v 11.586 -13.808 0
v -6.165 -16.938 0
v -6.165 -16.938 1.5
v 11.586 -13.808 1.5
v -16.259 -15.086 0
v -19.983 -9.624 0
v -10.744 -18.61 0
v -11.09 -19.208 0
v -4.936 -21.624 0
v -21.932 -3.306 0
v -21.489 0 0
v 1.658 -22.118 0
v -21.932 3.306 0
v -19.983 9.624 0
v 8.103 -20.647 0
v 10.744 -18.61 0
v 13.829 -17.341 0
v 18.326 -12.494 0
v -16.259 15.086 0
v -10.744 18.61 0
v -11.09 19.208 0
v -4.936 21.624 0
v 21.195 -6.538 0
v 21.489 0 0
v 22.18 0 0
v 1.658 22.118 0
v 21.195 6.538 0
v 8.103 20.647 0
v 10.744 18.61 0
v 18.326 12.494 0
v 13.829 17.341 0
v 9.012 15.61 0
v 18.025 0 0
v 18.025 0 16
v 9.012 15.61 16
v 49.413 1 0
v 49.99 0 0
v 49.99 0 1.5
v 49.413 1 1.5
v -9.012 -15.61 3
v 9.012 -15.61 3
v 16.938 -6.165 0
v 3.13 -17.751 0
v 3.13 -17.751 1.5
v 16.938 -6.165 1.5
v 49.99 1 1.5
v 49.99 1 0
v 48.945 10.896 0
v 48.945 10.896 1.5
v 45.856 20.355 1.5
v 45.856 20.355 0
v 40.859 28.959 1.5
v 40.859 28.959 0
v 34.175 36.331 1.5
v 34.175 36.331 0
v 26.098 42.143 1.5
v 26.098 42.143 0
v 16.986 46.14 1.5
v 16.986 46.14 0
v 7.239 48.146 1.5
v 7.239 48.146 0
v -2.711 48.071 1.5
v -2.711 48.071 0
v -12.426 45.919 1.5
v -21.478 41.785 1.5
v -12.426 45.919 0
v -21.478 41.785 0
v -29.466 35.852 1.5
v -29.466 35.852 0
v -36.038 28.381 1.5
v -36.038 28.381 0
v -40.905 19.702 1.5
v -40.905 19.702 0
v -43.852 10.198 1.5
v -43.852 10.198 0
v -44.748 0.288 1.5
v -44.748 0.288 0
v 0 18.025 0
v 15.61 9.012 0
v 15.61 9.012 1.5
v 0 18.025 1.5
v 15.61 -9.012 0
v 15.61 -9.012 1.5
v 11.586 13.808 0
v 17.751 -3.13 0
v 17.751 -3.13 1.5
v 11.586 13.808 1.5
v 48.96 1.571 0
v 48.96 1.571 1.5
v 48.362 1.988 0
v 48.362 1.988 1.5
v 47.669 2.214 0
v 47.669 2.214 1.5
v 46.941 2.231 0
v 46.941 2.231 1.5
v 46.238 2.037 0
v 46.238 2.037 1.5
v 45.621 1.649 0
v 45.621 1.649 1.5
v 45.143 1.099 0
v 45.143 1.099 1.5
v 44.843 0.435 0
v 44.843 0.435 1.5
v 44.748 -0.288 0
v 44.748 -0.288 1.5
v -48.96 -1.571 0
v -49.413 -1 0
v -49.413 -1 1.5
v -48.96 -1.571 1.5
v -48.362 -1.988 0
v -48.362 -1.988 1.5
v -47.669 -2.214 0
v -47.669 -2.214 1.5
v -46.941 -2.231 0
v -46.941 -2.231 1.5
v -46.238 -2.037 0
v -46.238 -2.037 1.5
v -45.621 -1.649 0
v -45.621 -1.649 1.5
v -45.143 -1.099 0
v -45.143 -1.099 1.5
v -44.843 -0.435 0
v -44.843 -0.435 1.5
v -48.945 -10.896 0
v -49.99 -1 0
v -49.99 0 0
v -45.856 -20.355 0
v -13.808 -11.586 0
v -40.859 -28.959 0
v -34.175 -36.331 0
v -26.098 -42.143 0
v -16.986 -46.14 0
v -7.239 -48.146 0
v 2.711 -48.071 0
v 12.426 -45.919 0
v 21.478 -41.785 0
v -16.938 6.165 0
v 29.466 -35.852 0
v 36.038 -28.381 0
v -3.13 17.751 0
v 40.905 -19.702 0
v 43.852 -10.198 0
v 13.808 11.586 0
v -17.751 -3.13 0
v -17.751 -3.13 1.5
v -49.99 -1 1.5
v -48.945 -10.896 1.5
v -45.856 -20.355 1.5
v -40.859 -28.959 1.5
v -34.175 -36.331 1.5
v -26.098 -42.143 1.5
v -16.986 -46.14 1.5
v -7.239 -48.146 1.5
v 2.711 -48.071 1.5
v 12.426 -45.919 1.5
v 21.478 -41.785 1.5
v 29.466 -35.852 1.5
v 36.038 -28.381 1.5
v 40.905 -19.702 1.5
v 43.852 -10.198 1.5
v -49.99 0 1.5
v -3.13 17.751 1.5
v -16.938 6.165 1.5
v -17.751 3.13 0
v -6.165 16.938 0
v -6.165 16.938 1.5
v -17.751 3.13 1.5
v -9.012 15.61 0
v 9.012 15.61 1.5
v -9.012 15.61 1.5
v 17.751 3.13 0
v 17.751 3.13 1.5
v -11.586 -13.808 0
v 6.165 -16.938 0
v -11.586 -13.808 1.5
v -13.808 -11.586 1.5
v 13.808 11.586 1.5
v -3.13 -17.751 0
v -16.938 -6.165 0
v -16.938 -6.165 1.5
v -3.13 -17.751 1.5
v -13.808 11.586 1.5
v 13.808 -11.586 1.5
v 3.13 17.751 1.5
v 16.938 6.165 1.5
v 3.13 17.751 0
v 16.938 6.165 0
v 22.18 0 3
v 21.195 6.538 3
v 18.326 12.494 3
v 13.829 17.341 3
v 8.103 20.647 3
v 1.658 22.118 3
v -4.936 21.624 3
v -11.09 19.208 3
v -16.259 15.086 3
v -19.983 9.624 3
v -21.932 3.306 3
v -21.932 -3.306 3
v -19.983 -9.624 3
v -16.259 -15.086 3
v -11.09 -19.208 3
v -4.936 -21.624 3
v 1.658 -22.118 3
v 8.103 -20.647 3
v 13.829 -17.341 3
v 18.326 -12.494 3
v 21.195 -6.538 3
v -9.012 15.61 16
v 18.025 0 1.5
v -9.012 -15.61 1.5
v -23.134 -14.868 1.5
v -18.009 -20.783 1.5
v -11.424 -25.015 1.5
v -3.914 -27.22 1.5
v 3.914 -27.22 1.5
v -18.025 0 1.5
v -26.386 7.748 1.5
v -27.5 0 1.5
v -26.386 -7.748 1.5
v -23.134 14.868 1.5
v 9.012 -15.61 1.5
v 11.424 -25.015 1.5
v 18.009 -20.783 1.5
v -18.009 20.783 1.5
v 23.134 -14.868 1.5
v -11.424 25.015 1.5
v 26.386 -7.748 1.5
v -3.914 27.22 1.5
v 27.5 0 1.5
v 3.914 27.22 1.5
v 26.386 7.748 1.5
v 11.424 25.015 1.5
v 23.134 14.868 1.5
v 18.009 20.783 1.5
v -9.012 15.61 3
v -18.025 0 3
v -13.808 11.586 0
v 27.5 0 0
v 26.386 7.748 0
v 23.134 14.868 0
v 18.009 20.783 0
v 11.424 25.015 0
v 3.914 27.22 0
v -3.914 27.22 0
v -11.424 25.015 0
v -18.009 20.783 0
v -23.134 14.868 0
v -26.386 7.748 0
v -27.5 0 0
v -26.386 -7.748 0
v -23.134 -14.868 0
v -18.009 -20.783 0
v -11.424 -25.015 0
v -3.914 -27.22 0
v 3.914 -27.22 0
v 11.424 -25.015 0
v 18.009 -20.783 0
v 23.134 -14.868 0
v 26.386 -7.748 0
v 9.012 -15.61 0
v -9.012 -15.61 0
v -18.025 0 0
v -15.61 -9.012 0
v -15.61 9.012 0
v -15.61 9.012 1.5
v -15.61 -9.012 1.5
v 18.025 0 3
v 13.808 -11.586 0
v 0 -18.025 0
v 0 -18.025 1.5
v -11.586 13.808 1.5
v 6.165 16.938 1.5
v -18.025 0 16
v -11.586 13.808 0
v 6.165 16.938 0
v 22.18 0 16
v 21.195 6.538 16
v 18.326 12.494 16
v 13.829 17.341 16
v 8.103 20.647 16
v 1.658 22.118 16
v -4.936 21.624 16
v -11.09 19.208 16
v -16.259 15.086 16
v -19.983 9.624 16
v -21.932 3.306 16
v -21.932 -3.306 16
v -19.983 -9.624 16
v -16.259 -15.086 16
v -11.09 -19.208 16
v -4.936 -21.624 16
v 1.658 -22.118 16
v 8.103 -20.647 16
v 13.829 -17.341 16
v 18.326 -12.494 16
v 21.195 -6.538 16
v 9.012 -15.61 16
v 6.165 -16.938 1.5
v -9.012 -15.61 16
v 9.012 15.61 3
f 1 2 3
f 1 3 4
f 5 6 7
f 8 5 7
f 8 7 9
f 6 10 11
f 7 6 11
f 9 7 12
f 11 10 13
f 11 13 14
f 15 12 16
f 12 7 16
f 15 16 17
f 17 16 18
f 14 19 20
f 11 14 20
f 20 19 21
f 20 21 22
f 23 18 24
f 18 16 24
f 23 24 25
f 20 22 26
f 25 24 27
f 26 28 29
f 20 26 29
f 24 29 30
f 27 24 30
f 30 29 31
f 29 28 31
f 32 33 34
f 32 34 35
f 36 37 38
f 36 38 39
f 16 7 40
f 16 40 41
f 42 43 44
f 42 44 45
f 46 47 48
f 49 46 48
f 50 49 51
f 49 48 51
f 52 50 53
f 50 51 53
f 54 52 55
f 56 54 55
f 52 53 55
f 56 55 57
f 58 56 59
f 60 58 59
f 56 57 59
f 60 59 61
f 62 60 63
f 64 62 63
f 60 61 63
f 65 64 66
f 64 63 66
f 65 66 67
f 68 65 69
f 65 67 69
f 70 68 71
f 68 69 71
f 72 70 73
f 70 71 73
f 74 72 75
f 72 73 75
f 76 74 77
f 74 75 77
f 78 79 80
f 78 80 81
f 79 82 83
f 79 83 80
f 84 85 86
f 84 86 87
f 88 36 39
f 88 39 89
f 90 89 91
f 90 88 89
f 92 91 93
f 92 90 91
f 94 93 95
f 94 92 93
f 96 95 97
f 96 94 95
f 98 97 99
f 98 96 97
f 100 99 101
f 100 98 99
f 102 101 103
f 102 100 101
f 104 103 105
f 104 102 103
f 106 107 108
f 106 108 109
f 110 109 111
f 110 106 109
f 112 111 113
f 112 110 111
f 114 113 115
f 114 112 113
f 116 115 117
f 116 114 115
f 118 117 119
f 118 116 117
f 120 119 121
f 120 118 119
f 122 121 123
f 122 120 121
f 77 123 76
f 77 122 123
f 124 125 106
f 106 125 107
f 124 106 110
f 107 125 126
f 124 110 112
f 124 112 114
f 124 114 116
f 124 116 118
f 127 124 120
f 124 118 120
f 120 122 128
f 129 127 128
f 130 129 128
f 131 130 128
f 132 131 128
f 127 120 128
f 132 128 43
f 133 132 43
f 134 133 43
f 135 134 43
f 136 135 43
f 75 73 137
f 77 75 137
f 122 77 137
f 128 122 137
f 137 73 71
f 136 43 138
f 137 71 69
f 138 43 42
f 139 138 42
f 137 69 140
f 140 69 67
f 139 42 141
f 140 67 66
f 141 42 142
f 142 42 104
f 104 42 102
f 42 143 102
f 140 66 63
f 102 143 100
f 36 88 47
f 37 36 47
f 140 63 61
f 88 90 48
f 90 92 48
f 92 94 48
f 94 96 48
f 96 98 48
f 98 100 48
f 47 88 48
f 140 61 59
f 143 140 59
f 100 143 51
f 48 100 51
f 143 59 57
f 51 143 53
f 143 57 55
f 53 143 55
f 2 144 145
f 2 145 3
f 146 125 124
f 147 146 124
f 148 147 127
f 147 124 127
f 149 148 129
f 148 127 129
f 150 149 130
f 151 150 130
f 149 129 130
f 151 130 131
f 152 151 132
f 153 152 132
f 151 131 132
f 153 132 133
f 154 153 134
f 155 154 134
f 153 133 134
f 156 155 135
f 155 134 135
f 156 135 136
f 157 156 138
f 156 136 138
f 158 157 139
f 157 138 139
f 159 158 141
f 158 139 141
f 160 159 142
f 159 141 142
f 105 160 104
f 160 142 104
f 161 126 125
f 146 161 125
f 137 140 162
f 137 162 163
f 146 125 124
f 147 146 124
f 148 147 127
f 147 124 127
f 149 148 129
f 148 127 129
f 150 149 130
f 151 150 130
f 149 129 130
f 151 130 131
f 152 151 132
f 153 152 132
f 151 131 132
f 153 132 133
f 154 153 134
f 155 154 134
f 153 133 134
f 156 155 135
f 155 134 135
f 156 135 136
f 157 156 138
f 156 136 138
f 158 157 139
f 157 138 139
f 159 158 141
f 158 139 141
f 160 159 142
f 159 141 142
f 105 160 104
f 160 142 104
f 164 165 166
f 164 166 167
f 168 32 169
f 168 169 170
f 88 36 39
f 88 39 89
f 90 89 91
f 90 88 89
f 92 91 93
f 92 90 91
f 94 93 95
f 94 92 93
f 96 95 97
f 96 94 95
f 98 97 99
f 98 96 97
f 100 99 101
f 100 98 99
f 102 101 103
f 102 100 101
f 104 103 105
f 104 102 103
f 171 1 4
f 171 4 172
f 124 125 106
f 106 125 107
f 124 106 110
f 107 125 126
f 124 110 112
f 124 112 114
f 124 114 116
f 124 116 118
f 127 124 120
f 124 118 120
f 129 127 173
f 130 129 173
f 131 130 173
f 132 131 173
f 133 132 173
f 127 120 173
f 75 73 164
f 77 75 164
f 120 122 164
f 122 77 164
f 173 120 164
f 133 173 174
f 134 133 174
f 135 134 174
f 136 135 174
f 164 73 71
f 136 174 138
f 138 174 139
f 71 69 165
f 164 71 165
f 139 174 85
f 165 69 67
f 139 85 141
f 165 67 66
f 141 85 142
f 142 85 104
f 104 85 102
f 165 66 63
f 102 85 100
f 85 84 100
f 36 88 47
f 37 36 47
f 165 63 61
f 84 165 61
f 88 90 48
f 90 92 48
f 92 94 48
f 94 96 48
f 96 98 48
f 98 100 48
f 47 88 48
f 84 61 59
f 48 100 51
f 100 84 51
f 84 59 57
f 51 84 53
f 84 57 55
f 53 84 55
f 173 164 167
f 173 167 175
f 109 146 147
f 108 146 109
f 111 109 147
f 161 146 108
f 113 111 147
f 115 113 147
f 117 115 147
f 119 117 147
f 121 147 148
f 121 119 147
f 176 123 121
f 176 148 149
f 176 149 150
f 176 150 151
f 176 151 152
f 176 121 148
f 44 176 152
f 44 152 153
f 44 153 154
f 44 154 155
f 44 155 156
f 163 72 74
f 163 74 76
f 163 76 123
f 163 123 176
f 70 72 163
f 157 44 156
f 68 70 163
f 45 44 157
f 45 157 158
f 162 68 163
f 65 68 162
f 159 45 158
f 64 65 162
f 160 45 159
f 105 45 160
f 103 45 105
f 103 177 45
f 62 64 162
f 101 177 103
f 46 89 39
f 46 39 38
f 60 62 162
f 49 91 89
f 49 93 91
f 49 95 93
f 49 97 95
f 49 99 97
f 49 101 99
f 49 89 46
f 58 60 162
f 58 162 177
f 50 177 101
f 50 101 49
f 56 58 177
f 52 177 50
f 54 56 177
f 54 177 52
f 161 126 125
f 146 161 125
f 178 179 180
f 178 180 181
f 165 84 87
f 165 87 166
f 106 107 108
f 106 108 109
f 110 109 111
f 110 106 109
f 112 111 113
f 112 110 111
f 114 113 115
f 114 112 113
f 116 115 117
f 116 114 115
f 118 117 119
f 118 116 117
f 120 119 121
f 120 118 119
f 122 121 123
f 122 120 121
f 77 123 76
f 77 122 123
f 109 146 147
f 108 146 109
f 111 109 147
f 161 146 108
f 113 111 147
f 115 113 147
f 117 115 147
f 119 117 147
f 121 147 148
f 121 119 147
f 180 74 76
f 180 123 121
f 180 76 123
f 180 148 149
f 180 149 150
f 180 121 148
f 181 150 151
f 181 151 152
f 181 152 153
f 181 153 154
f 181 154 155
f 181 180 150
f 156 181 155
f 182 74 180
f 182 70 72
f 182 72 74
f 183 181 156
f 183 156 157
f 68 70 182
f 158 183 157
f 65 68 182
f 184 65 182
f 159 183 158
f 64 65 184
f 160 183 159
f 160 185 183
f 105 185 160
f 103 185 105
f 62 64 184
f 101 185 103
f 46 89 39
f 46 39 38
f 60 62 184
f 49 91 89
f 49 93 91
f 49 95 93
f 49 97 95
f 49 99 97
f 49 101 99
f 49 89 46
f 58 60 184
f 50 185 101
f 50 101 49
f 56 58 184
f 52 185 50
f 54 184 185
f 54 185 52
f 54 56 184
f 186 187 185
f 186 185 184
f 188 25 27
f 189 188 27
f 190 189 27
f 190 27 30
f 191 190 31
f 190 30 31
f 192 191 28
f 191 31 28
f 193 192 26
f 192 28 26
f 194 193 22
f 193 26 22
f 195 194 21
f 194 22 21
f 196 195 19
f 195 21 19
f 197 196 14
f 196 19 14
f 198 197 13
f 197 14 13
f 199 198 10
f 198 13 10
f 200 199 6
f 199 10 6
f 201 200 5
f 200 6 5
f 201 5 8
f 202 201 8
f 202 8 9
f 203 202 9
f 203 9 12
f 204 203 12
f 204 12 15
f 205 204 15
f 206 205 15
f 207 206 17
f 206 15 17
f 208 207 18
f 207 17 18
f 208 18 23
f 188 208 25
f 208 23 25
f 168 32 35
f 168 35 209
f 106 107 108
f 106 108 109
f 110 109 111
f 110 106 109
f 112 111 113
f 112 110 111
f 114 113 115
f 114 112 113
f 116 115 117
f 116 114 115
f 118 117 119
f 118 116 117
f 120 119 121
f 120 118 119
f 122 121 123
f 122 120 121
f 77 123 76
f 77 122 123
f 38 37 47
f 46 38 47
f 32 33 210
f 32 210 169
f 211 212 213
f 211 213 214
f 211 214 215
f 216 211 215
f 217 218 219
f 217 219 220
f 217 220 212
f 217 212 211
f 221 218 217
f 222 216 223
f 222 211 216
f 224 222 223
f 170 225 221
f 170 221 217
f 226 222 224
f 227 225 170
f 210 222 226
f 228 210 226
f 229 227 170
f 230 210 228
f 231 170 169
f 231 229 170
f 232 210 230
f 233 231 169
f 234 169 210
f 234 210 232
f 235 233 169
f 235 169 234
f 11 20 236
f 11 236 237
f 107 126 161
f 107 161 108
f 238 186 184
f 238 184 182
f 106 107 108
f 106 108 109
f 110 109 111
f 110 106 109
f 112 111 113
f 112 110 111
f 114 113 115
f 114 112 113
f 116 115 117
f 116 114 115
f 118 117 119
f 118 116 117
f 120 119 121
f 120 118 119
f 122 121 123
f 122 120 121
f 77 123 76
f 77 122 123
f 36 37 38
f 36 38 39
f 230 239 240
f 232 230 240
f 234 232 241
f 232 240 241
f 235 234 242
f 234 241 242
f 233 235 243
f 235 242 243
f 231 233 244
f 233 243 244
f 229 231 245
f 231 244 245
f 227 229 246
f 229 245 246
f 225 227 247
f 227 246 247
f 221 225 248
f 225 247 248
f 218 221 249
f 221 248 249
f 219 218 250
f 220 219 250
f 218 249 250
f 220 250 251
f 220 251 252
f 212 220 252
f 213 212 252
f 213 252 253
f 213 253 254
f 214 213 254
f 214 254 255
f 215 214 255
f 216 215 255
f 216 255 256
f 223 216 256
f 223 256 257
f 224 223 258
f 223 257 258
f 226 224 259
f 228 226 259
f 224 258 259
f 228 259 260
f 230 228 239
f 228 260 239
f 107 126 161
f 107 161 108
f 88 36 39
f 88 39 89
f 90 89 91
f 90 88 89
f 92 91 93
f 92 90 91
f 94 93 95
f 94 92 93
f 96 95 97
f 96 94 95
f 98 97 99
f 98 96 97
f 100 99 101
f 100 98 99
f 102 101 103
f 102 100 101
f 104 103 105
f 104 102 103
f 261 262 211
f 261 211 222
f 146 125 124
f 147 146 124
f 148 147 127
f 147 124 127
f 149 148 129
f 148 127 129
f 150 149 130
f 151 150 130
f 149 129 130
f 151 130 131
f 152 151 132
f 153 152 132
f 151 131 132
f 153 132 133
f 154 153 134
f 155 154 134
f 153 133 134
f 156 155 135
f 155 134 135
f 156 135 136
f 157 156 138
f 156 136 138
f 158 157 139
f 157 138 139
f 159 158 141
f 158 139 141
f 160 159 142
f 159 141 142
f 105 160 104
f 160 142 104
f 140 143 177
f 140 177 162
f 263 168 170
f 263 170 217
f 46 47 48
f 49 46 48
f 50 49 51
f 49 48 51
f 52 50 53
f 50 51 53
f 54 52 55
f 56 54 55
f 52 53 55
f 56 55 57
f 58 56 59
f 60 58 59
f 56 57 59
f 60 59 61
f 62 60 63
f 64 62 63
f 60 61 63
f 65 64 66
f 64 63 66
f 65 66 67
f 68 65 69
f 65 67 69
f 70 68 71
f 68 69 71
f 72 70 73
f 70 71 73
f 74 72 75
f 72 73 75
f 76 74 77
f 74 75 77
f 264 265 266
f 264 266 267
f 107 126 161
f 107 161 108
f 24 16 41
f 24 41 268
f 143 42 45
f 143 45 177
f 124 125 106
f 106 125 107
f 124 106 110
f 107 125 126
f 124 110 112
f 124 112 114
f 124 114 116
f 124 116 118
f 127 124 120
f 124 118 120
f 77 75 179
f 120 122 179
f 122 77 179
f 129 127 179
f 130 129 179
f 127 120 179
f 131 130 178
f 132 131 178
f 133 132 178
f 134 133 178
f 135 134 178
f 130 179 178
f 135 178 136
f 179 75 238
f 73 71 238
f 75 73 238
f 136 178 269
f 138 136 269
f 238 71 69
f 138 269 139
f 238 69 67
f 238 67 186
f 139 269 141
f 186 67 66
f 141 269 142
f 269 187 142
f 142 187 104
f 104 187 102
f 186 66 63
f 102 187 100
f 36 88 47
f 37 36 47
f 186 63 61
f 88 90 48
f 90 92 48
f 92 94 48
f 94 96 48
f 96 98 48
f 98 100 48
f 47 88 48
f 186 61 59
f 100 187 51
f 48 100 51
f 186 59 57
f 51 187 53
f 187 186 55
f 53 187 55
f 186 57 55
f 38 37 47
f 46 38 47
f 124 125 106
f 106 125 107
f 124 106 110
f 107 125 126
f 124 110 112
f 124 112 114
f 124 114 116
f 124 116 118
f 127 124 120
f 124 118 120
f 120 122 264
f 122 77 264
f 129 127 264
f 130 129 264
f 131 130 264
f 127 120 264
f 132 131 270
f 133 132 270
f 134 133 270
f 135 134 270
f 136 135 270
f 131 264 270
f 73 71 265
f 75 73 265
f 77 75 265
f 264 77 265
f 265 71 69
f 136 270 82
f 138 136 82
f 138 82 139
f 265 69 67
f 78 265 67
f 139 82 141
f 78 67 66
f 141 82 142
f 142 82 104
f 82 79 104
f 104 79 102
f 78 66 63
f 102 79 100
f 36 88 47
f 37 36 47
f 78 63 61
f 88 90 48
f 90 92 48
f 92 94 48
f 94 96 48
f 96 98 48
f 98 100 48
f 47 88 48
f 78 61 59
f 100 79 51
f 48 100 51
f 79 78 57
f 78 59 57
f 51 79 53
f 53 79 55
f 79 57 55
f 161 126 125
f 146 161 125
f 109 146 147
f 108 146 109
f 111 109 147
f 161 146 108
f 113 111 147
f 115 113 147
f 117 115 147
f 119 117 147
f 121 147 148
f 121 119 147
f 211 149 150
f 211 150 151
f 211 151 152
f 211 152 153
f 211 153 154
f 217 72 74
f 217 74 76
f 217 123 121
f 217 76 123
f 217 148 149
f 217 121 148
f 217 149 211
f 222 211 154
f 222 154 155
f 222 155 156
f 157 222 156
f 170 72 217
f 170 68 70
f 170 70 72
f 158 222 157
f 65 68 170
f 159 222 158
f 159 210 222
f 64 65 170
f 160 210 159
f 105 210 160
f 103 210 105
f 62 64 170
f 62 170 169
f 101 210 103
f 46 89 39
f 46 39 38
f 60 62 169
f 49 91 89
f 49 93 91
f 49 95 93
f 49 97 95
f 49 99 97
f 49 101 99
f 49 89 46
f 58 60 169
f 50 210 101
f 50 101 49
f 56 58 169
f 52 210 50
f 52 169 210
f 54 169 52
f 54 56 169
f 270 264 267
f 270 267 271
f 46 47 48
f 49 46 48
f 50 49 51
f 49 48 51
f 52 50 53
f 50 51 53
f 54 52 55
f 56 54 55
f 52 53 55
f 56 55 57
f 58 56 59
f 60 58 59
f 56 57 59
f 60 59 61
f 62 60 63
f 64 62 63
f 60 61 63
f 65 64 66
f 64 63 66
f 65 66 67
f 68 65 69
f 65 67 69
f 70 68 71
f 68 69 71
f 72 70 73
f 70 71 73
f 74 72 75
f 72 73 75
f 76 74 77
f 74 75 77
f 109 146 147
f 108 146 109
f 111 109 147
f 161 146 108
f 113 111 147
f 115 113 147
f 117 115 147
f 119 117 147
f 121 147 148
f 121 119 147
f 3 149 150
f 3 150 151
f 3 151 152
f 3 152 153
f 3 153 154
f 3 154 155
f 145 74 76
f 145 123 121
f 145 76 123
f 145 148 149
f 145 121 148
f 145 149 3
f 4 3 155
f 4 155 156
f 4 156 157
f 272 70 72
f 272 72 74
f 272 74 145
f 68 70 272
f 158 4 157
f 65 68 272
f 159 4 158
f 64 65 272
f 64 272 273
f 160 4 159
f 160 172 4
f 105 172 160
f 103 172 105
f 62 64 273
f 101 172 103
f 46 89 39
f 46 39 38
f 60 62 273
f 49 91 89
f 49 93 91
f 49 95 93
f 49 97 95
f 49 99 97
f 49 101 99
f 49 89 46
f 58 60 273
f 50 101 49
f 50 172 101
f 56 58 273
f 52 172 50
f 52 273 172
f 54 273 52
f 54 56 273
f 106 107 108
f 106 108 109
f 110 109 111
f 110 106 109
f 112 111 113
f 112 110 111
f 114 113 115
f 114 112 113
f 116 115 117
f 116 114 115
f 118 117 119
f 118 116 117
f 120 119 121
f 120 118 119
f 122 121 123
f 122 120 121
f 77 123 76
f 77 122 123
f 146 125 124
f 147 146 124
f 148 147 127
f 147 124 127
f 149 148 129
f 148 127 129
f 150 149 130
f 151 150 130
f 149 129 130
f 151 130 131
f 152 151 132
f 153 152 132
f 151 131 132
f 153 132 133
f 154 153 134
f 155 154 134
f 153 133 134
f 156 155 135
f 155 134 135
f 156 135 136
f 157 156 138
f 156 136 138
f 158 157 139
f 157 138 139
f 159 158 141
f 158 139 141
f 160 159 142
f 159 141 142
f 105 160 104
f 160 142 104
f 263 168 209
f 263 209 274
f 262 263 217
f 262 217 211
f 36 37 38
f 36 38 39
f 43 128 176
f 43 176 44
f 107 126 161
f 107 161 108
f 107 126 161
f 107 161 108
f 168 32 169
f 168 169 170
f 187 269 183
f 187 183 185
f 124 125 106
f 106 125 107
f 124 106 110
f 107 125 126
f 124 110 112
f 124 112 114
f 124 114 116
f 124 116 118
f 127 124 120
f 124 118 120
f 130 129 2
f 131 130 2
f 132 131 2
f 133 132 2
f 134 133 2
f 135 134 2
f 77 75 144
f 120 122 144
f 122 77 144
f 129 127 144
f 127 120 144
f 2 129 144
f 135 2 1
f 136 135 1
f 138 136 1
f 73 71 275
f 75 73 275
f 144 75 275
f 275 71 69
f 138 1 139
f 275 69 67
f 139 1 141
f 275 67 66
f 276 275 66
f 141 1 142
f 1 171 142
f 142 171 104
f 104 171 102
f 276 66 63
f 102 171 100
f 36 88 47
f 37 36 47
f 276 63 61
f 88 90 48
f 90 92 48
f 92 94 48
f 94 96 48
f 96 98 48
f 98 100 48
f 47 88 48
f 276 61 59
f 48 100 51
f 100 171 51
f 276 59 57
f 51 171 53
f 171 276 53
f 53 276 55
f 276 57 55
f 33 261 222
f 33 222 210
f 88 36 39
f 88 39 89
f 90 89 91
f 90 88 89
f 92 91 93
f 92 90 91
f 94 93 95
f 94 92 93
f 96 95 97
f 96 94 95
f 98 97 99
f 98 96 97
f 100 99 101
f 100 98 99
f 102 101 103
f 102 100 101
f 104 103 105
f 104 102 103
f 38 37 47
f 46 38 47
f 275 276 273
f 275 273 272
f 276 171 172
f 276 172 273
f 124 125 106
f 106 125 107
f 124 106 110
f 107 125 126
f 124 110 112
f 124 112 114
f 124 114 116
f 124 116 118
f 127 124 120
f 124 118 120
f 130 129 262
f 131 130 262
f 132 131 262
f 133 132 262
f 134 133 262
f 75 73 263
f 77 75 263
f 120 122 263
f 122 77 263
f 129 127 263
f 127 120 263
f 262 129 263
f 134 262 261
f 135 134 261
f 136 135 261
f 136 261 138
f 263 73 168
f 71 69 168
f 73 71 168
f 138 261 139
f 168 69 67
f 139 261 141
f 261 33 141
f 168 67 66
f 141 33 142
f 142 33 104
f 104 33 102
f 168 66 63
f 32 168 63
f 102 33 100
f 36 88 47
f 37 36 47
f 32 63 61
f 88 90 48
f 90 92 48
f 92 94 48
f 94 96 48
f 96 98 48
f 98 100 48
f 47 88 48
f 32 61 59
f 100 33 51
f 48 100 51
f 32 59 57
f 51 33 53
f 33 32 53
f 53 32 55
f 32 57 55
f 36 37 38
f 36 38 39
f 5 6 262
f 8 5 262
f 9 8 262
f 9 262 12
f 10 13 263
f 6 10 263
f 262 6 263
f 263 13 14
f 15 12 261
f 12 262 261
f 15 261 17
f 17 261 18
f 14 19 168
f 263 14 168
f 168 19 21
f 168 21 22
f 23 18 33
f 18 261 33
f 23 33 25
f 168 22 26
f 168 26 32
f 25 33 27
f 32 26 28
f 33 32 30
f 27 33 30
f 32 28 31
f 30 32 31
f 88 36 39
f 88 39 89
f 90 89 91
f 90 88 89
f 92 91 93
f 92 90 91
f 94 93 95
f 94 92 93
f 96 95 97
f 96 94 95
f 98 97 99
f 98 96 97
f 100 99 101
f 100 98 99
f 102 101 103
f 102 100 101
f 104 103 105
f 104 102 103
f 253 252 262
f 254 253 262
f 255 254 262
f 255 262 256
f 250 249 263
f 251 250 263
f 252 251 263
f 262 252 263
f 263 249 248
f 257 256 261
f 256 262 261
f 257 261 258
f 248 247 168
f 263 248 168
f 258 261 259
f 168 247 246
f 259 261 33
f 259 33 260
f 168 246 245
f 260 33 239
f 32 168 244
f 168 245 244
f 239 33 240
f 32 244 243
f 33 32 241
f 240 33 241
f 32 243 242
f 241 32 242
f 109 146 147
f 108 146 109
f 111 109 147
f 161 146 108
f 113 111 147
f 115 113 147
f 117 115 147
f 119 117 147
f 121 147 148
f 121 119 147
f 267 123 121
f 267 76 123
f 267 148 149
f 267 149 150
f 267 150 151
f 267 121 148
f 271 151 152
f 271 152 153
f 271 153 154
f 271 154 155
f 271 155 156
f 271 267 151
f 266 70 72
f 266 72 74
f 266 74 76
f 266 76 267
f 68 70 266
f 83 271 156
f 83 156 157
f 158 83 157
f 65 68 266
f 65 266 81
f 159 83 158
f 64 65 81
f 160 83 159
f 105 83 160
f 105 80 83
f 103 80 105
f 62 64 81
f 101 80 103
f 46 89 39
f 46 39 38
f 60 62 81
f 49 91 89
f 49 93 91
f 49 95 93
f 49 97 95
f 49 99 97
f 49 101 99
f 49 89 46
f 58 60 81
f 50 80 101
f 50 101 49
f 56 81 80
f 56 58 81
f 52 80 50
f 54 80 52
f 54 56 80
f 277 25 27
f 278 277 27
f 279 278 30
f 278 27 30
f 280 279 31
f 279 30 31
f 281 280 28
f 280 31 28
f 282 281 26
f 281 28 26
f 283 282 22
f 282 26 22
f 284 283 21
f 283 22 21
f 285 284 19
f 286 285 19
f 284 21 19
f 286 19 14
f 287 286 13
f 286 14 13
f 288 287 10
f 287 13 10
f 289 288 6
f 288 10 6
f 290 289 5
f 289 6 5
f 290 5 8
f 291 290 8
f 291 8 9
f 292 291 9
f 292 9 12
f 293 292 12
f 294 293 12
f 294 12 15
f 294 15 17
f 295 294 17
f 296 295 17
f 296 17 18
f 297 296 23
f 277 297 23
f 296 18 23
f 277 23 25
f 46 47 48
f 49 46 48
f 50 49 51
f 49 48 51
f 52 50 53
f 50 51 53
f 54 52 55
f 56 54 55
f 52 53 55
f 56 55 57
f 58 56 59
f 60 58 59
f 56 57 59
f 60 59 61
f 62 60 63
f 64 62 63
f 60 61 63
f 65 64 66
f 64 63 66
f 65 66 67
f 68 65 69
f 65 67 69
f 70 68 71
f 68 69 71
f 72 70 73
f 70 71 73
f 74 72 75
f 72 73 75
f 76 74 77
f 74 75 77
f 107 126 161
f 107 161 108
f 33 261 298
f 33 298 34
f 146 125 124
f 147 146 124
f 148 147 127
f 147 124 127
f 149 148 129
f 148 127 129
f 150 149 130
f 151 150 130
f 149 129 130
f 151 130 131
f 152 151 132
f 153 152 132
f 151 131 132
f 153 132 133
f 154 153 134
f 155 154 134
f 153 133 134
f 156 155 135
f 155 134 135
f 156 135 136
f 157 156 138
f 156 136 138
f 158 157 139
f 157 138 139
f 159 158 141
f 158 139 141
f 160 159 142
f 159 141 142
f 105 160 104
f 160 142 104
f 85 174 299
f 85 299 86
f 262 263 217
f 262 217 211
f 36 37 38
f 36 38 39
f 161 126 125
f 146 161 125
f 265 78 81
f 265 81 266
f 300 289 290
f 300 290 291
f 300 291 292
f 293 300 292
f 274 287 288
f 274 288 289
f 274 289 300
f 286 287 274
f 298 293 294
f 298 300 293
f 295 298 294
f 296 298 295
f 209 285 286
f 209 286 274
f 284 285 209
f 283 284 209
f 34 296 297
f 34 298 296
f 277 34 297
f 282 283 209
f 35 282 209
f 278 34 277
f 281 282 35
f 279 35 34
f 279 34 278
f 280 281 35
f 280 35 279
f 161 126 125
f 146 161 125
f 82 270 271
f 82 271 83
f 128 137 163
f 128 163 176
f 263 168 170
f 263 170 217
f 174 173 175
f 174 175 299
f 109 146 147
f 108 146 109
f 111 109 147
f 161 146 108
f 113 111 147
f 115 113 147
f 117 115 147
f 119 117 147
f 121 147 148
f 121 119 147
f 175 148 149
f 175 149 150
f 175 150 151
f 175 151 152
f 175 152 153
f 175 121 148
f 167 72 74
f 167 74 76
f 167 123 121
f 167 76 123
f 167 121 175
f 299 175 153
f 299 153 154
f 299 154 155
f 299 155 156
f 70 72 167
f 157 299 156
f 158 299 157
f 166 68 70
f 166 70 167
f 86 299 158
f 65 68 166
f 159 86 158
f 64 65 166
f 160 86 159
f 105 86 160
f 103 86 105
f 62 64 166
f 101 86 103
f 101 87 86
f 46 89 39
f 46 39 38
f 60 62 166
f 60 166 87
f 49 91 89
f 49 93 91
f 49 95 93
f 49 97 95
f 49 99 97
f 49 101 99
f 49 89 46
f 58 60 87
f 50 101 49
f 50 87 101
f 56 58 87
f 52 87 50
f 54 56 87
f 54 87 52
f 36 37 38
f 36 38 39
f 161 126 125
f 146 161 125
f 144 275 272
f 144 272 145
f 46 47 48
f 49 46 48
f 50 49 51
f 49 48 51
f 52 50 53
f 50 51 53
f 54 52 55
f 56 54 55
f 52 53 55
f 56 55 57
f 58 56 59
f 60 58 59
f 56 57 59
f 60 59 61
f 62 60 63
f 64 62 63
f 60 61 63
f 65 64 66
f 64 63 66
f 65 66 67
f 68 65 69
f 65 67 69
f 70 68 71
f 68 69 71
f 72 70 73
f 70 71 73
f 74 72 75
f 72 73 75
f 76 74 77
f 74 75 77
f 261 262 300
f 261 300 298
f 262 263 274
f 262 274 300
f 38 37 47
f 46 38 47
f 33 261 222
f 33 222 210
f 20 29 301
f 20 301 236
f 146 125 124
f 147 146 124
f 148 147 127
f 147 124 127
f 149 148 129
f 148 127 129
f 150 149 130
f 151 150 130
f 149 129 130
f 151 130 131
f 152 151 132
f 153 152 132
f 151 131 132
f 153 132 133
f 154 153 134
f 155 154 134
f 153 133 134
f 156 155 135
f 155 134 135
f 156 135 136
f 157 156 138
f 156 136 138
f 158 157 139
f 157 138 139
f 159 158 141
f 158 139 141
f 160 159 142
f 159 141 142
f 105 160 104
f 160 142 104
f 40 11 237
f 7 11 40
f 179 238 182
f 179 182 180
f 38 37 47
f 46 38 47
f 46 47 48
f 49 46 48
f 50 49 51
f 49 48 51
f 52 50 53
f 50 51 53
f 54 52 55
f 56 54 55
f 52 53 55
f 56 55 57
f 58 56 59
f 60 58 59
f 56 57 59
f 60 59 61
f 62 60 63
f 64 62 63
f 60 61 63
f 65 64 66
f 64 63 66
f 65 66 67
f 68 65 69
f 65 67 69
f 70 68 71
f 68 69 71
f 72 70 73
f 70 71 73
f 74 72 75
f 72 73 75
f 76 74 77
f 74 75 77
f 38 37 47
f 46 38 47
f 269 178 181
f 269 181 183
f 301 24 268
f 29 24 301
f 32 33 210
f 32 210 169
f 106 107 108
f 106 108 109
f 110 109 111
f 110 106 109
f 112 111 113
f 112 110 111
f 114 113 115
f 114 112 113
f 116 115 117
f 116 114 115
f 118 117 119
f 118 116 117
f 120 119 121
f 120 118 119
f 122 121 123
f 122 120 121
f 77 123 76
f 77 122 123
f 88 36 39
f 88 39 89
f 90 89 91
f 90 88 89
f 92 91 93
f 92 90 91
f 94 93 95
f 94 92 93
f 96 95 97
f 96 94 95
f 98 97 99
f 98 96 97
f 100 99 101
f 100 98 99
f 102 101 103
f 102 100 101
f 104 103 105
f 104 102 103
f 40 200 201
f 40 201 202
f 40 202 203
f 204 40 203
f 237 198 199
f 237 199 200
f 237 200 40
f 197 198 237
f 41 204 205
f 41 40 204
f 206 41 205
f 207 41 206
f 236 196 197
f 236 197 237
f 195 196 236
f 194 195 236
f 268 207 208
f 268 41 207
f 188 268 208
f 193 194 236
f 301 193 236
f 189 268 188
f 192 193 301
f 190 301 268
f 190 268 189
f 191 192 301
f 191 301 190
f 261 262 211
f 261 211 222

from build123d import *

# Parameters (mm, degrees)
PAD001_DEPTH = 1.5
SKETCH018_R  = 22.18
PAD007_DEPTH = 3
CHAMFER_SIZE = 2.9999
SKETCH019_R  = 27.5
PAD008_DEPTH = 1.5
PAD009_DEPTH = 1.5
PAD010_DEPTH = 1.5
PAD011_DEPTH = 1.5
PAD012_DEPTH = 1.5
PAD013_DEPTH = 1.5
SKETCH035_R  = 22.18
PAD014_DEPTH = 16


with BuildPart() as cuchilla001:
    # Sketch001 → Pad001 (new body)
    with BuildSketch(Plane.XY):
        with BuildLine():
            Line((49.989999, 0), (49.989999, 1))
            ThreePointArc((49.989999, 1), (2.262175, 48.370273), (-44.747868, 0.287597))
            ThreePointArc((-49.412649, -1), (-46.582398, -2.159881), (-44.747868, 0.287597))
            Line((-49.989999, 0), (-49.412649, -1))
            Line((-49.989999, 0), (-49.989999, -1))
            ThreePointArc((-49.989999, -1), (-2.262175, -48.370273), (44.747868, -0.287597))
            ThreePointArc((49.412649, 1), (46.582398, 2.159881), (44.747868, -0.287597))
            Line((49.989999, 0), (49.412649, 1))
        make_face()
        Polygon((-9.012438, -15.61), (9.012438, -15.61), (18.024875, 0), (9.012438, 15.61), (-9.012438, 15.61), (-18.024875, 0), align=None, mode=Mode.SUBTRACT)
    extrude(amount=PAD001_DEPTH)


with BuildPart() as separadorcuchillainicial:
    # Sketch018 → Pad007 (new body)
    with BuildSketch(Plane.XY):
        Circle(SKETCH018_R)
        Polygon((9.012438, 15.61), (-9.012438, 15.61), (-18.024875, 0), (-9.012438, -15.61), (9.012438, -15.61), (18.024875, 0), align=None, mode=Mode.SUBTRACT)
    extrude(amount=PAD007_DEPTH)

    # Chamfer
    chamfer_edges = [separadorcuchillainicial.edges().sort_by_distance(p)[0] for p in [
        (0, -15.61, 0),
        (13.518657, -7.805, 0),
        (13.518657, 7.805, 0),
        (0, 15.61, 0),
        (-13.518657, 7.805, 0),
        (-13.518657, -7.805, 0),
    ]]
    chamfer(chamfer_edges, length=CHAMFER_SIZE)


with BuildPart() as separadorcuchilla:
    # Sketch019 → Pad008 (new body)
    with BuildSketch(Plane.XY):
        Circle(SKETCH019_R)
        Polygon((9.012438, 15.61), (-9.012438, 15.61), (-18.024875, 0), (-9.012438, -15.61), (9.012438, -15.61), (18.024875, 0), align=None, mode=Mode.SUBTRACT)
    extrude(amount=PAD008_DEPTH)


with BuildPart() as cuchilla002:
    # Sketch021 → Pad009 (new body)
    with BuildSketch(Plane.XY):
        with BuildLine():
            Line((49.989999, 0), (49.989999, 1))
            ThreePointArc((49.989999, 1), (2.262175, 48.370273), (-44.747868, 0.287597))
            ThreePointArc((-49.412649, -1), (-46.582398, -2.159881), (-44.747868, 0.287597))
            Line((-49.989999, 0), (-49.412649, -1))
            Line((-49.989999, 0), (-49.989999, -1))
            ThreePointArc((-49.989999, -1), (-2.262175, -48.370273), (44.747868, -0.287597))
            ThreePointArc((49.412649, 1), (46.582398, 2.159881), (44.747868, -0.287597))
            Line((49.989999, 0), (49.412649, 1))
        make_face()
        Polygon((-6.16487, -16.937842), (11.586167, -13.807856), (17.751037, 3.129987), (6.16487, 16.937842), (-11.586167, 13.807856), (-17.751037, -3.129987), align=None, mode=Mode.SUBTRACT)
    extrude(amount=PAD009_DEPTH)


with BuildPart() as cuchilla003:
    # Sketch024 → Pad010 (new body)
    with BuildSketch(Plane.XY):
        with BuildLine():
            Line((49.989999, 0), (49.989999, 1))
            ThreePointArc((49.989999, 1), (2.262175, 48.370273), (-44.747868, 0.287597))
            ThreePointArc((-49.412649, -1), (-46.582398, -2.159881), (-44.747868, 0.287597))
            Line((-49.989999, 0), (-49.412649, -1))
            Line((-49.989999, 0), (-49.989999, -1))
            ThreePointArc((-49.989999, -1), (-2.262175, -48.370273), (44.747868, -0.287597))
            ThreePointArc((49.412649, 1), (46.582398, 2.159881), (44.747868, -0.287597))
            Line((49.989999, 0), (49.412649, 1))
        make_face()
        Polygon((-3.129987, -17.751037), (13.807856, -11.586167), (16.937842, 6.16487), (3.129987, 17.751037), (-13.807856, 11.586167), (-16.937842, -6.16487), align=None, mode=Mode.SUBTRACT)
    extrude(amount=PAD010_DEPTH)


with BuildPart() as cuchilla004:
    # Sketch027 → Pad011 (new body)
    with BuildSketch(Plane.XY):
        with BuildLine():
            Line((49.989999, 0), (49.989999, 1))
            ThreePointArc((49.989999, 1), (2.262175, 48.370273), (-44.747868, 0.287597))
            ThreePointArc((-49.412649, -1), (-46.582398, -2.159881), (-44.747868, 0.287597))
            Line((-49.989999, 0), (-49.412649, -1))
            Line((-49.989999, 0), (-49.989999, -1))
            ThreePointArc((-49.989999, -1), (-2.262175, -48.370273), (44.747868, -0.287597))
            ThreePointArc((49.412649, 1), (46.582398, 2.159881), (44.747868, -0.287597))
            Line((49.989999, 0), (49.412649, 1))
        make_face()
        Polygon((0, -18.024875), (15.61, -9.012438), (15.61, 9.012438), (0, 18.024875), (-15.61, 9.012438), (-15.61, -9.012438), align=None, mode=Mode.SUBTRACT)
    extrude(amount=PAD011_DEPTH)


with BuildPart() as cuchilla005:
    # Sketch030 → Pad012 (new body)
    with BuildSketch(Plane.XY):
        with BuildLine():
            Line((49.989999, 0), (49.989999, 1))
            ThreePointArc((49.989999, 1), (2.262175, 48.370273), (-44.747868, 0.287597))
            ThreePointArc((-49.412649, -1), (-46.582398, -2.159881), (-44.747868, 0.287597))
            Line((-49.989999, 0), (-49.412649, -1))
            Line((-49.989999, 0), (-49.989999, -1))
            ThreePointArc((-49.989999, -1), (-2.262175, -48.370273), (44.747868, -0.287597))
            ThreePointArc((49.412649, 1), (46.582398, 2.159881), (44.747868, -0.287597))
            Line((49.989999, 0), (49.412649, 1))
        make_face()
        Polygon((3.129987, -17.751037), (16.937842, -6.16487), (13.807856, 11.586167), (-3.129987, 17.751037), (-16.937842, 6.16487), (-13.807856, -11.586167), align=None, mode=Mode.SUBTRACT)
    extrude(amount=PAD012_DEPTH)


with BuildPart() as cuchilla006:
    # Sketch033 → Pad013 (new body)
    with BuildSketch(Plane.XY):
        with BuildLine():
            Line((49.989999, 0), (49.989999, 1))
            ThreePointArc((49.989999, 1), (2.262175, 48.370273), (-44.747868, 0.287597))
            ThreePointArc((-49.412649, -1), (-46.582398, -2.159881), (-44.747868, 0.287597))
            Line((-49.989999, 0), (-49.412649, -1))
            Line((-49.989999, 0), (-49.989999, -1))
            ThreePointArc((-49.989999, -1), (-2.262175, -48.370273), (44.747868, -0.287597))
            ThreePointArc((49.412649, 1), (46.582398, 2.159881), (44.747868, -0.287597))
            Line((49.989999, 0), (49.412649, 1))
        make_face()
        Polygon((6.16487, -16.937842), (17.751037, -3.129987), (11.586167, 13.807856), (-6.16487, 16.937842), (-17.751037, 3.129987), (-11.586167, -13.807856), align=None, mode=Mode.SUBTRACT)
    extrude(amount=PAD013_DEPTH)


with BuildPart() as separadorcuchillafinal:
    # Sketch035 → Pad014 (new body)
    with BuildSketch(Plane.XY):
        Circle(SKETCH035_R)
        Polygon((9.012438, 15.61), (-9.012438, 15.61), (-18.024875, 0), (-9.012438, -15.61), (9.012438, -15.61), (18.024875, 0), align=None, mode=Mode.SUBTRACT)
    extrude(amount=PAD014_DEPTH)


solid = Compound([cuchilla001.part, separadorcuchillainicial.part, separadorcuchilla.part, cuchilla002.part, cuchilla003.part, cuchilla004.part, cuchilla005.part, cuchilla006.part, separadorcuchillafinal.part])
